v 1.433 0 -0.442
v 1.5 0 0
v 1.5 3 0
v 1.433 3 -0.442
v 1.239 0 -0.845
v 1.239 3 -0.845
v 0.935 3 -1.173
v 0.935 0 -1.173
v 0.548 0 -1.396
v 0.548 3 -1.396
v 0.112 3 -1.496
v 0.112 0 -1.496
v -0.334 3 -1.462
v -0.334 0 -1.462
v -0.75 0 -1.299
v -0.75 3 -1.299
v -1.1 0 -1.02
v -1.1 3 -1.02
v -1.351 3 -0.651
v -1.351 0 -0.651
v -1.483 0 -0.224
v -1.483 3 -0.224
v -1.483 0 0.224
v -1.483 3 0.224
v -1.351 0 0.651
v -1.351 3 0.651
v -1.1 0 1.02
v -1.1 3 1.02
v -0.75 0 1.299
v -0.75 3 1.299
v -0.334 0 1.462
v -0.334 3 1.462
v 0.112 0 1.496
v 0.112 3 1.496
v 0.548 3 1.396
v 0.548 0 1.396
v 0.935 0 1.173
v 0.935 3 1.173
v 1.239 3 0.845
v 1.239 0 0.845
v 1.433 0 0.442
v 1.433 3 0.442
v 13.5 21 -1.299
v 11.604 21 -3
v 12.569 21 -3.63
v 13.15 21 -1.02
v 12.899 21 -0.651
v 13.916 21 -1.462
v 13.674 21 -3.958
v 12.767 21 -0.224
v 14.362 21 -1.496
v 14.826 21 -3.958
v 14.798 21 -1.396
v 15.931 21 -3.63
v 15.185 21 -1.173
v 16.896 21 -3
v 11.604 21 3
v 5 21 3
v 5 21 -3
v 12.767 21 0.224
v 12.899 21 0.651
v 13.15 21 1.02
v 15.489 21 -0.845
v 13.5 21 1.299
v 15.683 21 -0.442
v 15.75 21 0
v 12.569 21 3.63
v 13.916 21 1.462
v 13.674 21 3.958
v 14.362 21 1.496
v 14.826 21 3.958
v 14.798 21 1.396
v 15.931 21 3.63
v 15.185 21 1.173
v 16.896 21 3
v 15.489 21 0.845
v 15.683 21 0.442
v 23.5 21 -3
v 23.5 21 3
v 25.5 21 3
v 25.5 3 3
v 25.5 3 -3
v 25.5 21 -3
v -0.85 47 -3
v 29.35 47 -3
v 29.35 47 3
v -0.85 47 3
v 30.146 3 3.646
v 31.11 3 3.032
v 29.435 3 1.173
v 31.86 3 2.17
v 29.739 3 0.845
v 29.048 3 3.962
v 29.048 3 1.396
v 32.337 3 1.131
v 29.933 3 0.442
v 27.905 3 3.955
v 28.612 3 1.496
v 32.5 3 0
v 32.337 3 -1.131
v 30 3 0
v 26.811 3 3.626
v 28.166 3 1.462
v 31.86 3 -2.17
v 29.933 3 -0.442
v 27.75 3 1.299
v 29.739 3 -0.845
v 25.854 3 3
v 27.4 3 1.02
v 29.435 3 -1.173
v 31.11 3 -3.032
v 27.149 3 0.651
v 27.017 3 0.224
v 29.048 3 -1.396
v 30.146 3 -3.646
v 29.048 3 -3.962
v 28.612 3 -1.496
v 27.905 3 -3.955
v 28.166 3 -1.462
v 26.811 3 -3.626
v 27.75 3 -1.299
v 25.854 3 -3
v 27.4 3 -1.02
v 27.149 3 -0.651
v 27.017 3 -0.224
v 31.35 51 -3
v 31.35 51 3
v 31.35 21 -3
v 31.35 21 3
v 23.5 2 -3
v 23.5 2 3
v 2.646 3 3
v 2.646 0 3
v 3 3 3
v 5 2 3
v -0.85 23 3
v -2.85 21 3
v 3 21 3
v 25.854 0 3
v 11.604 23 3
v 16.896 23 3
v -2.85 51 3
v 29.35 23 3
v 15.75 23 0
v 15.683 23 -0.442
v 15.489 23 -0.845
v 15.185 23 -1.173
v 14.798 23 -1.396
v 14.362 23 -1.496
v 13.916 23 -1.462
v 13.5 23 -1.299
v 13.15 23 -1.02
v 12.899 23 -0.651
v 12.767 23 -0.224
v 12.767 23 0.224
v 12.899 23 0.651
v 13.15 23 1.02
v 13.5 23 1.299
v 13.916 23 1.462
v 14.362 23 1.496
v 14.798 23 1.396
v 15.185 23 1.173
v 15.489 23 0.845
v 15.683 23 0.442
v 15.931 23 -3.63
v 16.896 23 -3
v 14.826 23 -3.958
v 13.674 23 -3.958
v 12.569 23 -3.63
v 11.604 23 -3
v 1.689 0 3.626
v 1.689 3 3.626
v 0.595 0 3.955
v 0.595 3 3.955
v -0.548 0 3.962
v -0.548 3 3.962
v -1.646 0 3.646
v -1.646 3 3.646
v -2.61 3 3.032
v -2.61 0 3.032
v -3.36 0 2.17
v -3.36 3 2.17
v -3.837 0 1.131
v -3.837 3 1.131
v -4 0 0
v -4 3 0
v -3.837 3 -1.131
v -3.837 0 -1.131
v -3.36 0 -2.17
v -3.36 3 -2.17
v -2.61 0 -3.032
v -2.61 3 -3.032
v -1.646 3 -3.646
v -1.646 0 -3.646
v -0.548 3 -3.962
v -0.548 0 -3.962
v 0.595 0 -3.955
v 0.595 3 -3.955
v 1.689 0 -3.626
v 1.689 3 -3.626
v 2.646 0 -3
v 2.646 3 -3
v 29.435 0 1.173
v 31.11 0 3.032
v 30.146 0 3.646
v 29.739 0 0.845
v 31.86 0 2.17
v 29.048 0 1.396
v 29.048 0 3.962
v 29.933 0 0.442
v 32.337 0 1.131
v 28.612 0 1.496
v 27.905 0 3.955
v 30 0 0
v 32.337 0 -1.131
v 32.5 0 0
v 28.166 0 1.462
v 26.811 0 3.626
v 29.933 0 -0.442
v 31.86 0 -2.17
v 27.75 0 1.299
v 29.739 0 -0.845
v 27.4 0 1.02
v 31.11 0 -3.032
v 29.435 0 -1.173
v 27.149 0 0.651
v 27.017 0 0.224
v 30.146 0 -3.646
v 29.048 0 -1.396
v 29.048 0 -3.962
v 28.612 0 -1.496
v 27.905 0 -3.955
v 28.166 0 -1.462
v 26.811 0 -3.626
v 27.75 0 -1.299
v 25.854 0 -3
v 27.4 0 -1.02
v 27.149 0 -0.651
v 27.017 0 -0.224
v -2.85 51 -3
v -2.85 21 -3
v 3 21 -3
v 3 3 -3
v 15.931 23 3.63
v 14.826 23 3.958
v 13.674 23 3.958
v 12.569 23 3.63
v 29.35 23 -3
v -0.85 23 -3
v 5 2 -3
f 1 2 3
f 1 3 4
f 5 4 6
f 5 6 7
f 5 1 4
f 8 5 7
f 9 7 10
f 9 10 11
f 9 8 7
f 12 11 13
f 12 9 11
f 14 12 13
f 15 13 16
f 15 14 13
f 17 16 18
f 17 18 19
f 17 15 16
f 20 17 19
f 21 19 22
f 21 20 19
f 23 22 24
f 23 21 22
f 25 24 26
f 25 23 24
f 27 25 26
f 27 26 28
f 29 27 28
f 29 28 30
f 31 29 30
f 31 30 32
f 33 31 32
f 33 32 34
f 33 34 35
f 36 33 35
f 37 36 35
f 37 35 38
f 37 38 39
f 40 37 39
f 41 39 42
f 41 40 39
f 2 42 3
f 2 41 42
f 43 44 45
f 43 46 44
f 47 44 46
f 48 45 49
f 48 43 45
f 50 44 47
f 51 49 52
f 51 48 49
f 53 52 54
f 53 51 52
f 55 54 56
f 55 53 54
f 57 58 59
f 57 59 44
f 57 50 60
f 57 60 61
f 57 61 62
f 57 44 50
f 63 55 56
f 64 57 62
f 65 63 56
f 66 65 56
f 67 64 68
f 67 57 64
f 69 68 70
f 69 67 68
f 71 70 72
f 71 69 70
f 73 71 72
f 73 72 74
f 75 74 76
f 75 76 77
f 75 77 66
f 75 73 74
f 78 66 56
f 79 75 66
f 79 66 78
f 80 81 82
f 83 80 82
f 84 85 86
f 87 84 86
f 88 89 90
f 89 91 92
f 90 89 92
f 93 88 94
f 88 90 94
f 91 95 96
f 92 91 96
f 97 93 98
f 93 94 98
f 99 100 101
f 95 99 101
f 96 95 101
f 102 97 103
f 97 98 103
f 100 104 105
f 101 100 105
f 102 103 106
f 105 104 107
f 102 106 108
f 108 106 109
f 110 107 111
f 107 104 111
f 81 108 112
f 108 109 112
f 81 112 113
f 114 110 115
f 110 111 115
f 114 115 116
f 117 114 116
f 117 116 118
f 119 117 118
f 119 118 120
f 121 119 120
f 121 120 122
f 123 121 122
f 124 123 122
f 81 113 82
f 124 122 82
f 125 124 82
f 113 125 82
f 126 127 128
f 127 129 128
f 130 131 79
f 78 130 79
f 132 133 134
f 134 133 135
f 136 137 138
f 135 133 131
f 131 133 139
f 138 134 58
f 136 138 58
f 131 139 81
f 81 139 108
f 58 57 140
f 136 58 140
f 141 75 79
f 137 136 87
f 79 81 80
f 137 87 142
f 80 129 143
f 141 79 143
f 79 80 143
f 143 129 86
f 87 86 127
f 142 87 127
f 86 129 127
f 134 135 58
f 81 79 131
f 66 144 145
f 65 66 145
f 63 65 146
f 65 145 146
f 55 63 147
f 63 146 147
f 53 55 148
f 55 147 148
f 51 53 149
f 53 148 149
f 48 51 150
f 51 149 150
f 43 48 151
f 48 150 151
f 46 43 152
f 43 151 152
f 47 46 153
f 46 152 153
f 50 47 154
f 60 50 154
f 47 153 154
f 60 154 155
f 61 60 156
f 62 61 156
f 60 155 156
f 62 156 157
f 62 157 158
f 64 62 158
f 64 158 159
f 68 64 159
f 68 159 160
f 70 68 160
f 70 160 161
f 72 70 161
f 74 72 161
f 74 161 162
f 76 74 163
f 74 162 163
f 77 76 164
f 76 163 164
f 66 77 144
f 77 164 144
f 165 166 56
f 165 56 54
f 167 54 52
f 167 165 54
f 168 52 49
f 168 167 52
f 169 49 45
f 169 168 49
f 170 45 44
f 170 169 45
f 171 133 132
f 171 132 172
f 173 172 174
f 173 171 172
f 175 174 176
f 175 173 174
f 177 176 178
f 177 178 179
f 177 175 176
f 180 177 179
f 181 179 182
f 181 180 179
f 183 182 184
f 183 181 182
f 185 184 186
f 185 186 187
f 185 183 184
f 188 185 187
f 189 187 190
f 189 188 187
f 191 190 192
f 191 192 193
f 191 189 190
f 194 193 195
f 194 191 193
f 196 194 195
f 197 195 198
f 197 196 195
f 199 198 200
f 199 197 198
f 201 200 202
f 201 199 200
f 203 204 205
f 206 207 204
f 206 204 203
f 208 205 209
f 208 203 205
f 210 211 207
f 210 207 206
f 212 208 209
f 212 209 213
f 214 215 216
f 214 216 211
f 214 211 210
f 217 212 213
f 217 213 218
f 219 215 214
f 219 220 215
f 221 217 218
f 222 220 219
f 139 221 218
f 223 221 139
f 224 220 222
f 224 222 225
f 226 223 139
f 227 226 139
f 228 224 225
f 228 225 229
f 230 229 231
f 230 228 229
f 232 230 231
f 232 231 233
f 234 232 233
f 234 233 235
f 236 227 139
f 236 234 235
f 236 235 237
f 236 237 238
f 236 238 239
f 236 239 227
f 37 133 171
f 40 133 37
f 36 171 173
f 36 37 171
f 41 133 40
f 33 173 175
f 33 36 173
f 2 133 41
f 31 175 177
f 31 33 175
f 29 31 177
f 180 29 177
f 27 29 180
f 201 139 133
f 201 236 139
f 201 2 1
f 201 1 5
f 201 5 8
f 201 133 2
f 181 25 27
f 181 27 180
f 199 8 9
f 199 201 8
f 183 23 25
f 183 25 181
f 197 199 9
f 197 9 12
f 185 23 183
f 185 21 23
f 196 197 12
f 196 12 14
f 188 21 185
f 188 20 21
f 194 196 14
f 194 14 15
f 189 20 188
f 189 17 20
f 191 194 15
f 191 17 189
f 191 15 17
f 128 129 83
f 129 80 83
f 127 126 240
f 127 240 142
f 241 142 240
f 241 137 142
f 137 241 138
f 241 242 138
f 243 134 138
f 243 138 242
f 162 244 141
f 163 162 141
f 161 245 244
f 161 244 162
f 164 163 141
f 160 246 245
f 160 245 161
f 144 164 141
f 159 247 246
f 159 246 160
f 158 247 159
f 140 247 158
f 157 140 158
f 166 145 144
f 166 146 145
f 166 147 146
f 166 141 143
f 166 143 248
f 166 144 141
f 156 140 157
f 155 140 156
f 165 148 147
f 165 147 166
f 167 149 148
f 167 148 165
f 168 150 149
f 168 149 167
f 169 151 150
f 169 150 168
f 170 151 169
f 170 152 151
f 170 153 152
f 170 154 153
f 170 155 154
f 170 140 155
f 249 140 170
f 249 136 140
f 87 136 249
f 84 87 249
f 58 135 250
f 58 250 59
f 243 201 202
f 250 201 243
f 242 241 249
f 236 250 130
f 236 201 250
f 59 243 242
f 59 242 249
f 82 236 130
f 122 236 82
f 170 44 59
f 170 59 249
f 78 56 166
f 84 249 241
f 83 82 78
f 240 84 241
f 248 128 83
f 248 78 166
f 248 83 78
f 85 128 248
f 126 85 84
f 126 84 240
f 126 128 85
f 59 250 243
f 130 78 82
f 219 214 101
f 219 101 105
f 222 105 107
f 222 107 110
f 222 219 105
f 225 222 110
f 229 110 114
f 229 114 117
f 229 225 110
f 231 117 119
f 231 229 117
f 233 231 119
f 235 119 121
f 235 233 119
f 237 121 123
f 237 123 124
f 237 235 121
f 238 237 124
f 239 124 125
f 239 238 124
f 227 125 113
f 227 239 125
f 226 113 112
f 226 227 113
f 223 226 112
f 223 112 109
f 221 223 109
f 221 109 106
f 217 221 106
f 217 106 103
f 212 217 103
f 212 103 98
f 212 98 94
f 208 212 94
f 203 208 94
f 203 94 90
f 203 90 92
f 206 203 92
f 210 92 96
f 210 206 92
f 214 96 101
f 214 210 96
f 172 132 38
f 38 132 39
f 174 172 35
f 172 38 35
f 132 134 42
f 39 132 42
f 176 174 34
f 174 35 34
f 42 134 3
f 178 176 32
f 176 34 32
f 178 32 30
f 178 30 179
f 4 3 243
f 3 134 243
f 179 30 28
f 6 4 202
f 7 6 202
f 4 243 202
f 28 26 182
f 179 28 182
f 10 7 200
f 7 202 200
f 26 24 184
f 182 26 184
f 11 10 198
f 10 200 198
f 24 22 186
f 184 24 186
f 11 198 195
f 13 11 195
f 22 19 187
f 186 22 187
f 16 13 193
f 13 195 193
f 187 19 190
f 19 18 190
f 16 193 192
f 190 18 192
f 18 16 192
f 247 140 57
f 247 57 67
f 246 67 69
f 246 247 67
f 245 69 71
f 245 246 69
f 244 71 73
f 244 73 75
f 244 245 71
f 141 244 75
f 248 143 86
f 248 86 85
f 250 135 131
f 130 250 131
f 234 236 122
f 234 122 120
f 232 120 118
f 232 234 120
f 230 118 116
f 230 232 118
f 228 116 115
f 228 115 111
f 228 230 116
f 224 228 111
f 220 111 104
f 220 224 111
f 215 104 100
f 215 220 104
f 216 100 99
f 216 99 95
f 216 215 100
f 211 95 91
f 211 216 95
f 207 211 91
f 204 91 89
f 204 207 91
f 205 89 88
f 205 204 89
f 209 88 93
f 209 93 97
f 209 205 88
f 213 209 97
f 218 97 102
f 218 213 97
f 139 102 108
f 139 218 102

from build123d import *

# Parameters (mm, degrees)
SKETCH1_R           = 1.5
BOSS_EXTRUDE1_DEPTH = 3
SKETCH2_W           = 22.5
SKETCH2_H           = 6
BOSS_EXTRUDE2_DEPTH = 20
SKETCH3_W           = 18.5
SKETCH3_H           = 19
CUT_EXTRUDE1_DEPTH  = 10
SKETCH4_W           = 3.85
SKETCH4_H           = 6
BOSS_EXTRUDE3_DEPTH = 2
SKETCH5_R           = 1.5
CUT_EXTRUDE2_DEPTH  = 2
SKETCH6_W           = 6
SKETCH6_H           = 2
BOSS_EXTRUDE4_DEPTH = 2
SKETCH7_W           = 2
SKETCH7_H           = 6
BOSS_EXTRUDE5_DEPTH = 28
SKETCH8_W           = 6
SKETCH8_H           = 2
BOSS_EXTRUDE6_DEPTH = 2
SKETCH9_W           = 2
SKETCH9_H           = 6
BOSS_EXTRUDE7_DEPTH = 28
SKETCH11_W          = 6
SKETCH11_H          = 4
BOSS_EXTRUDE8_DEPTH = 31


with BuildPart() as part:
    # Sketch1 → Boss-Extrude1 (new body)
    with BuildSketch(Plane(origin=(0, 0, 0), x_dir=(1, 0, 0), z_dir=(0, 1, 0))):
        with BuildLine():
            Line((2.645751311, 3), (25.854248689, 3))
            ThreePointArc((25.854248689, 3), (32.5, 0), (25.854248689, -3))
            Line((25.854248689, -3), (2.645751311, -3))
            ThreePointArc((2.645751311, -3), (-4, 0), (2.645751311, 3))
        make_face()
        Circle(SKETCH1_R, mode=Mode.SUBTRACT)
        with Locations((28.5, 0)):
            Circle(SKETCH1_R, mode=Mode.SUBTRACT)
    extrude(amount=BOSS_EXTRUDE1_DEPTH)

    # Sketch2 → Boss-Extrude2 (add)
    with BuildSketch(Plane(origin=(0, 3, 0), x_dir=(1, 0, 0), z_dir=(0, 1, 0))):
        with Locations((14.25, 0)):
            Rectangle(SKETCH2_W, SKETCH2_H)
    extrude(amount=BOSS_EXTRUDE2_DEPTH)

    # Sketch3 → Cut-Extrude1 (cut)
    with BuildSketch(Plane.XY.offset(3)):
        with Locations((14.25, 11.5)):
            Rectangle(SKETCH3_W, SKETCH3_H)
    extrude(amount=-CUT_EXTRUDE1_DEPTH, mode=Mode.SUBTRACT)

    # Sketch4 → Boss-Extrude3 (add)
    with BuildSketch(Plane(origin=(0, 23, 0), x_dir=(1, 0, 0), z_dir=(0, 1, 0))):
        with BuildLine():
            Line((11.604248689, 3), (16.895751311, 3))
            ThreePointArc((16.895751311, 3), (14.25, 4), (11.604248689, 3))
        make_face()
        with Locations((27.425, 0)):
            Rectangle(SKETCH4_W, SKETCH4_H)
        with Locations((1.075, 0)):
            Rectangle(SKETCH4_W, SKETCH4_H)
        with BuildLine():
            ThreePointArc((11.604248689, -3), (14.25, -4), (16.895751311, -3))
            Line((16.895751311, -3), (11.604248689, -3))
        make_face()
    extrude(amount=-BOSS_EXTRUDE3_DEPTH)

    # Sketch5 → Cut-Extrude2 (cut)
    with BuildSketch(Plane(origin=(0, 23, 0), x_dir=(1, 0, 0), z_dir=(0, 1, 0))):
        with Locations((14.25, 0)):
            Circle(SKETCH5_R)
    extrude(amount=-CUT_EXTRUDE2_DEPTH, mode=Mode.SUBTRACT)

    # Sketch6 → Boss-Extrude4 (add)
    with BuildSketch(Plane.ZY.offset(0.85)):
        with Locations((0, 22)):
            Rectangle(SKETCH6_W, SKETCH6_H)
    extrude(amount=BOSS_EXTRUDE4_DEPTH)

    # Sketch7 → Boss-Extrude5 (add)
    with BuildSketch(Plane(origin=(0, 23, 0), x_dir=(1, 0, 0), z_dir=(0, 1, 0))):
        with Locations((-1.85, 0)):
            Rectangle(SKETCH7_W, SKETCH7_H)
    extrude(amount=BOSS_EXTRUDE5_DEPTH)

    # Sketch8 → Boss-Extrude6 (add)
    with BuildSketch(Plane(origin=(29.35, 0, 0), x_dir=(0, 0, -1), z_dir=(1, 0, 0))):
        with Locations((0, 22)):
            Rectangle(SKETCH8_W, SKETCH8_H)
    extrude(amount=BOSS_EXTRUDE6_DEPTH)

    # Sketch9 → Boss-Extrude7 (add)
    with BuildSketch(Plane(origin=(0, 23, 0), x_dir=(1, 0, 0), z_dir=(0, 1, 0))):
        with Locations((30.35, 0)):
            Rectangle(SKETCH9_W, SKETCH9_H)
    extrude(amount=BOSS_EXTRUDE7_DEPTH)

    # Sketch11 → Boss-Extrude8 (add)
    with BuildSketch(Plane.ZY.offset(-29.35)):
        with Locations((0, 49)):
            Rectangle(SKETCH11_W, SKETCH11_H)
    extrude(amount=BOSS_EXTRUDE8_DEPTH)


solid = part.part
